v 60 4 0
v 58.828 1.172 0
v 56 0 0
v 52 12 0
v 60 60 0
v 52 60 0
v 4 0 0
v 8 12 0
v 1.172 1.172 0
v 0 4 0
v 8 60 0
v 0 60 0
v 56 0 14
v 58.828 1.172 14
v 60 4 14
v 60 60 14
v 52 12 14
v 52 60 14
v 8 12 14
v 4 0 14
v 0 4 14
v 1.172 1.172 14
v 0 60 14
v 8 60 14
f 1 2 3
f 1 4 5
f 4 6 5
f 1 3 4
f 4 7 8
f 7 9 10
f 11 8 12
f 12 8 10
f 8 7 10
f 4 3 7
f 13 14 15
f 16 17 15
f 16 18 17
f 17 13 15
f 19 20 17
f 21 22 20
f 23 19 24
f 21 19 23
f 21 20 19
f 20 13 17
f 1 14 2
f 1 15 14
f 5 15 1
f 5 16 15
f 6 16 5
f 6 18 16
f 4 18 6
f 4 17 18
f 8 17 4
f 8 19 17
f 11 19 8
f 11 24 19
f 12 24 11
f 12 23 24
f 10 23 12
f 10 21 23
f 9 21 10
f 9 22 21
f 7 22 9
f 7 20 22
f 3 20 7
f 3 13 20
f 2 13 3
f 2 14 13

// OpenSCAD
$fn = 32;

// ----------------------------------------------------------------------
// Heat sink frame: 60 x 60 mm frame, 8 mm walls
// ----------------------------------------------------------------------

// --- parameters (mm) ---
profile_height = 14;      // extrusion height
profile_points = 12;      // points of the closed outline

profile = [[0, 4], [1.172, 1.172], [4, 0], [56, 0], [58.828, 1.172], [60, 4], [60, 60], [52, 60], [52, 12], [8, 12], [8, 60], [0, 60]];  // single closed polygon, 12 points, counter clockwise

// --- the one profile operation ---
linear_extrude(height = profile_height) polygon(points = profile);
